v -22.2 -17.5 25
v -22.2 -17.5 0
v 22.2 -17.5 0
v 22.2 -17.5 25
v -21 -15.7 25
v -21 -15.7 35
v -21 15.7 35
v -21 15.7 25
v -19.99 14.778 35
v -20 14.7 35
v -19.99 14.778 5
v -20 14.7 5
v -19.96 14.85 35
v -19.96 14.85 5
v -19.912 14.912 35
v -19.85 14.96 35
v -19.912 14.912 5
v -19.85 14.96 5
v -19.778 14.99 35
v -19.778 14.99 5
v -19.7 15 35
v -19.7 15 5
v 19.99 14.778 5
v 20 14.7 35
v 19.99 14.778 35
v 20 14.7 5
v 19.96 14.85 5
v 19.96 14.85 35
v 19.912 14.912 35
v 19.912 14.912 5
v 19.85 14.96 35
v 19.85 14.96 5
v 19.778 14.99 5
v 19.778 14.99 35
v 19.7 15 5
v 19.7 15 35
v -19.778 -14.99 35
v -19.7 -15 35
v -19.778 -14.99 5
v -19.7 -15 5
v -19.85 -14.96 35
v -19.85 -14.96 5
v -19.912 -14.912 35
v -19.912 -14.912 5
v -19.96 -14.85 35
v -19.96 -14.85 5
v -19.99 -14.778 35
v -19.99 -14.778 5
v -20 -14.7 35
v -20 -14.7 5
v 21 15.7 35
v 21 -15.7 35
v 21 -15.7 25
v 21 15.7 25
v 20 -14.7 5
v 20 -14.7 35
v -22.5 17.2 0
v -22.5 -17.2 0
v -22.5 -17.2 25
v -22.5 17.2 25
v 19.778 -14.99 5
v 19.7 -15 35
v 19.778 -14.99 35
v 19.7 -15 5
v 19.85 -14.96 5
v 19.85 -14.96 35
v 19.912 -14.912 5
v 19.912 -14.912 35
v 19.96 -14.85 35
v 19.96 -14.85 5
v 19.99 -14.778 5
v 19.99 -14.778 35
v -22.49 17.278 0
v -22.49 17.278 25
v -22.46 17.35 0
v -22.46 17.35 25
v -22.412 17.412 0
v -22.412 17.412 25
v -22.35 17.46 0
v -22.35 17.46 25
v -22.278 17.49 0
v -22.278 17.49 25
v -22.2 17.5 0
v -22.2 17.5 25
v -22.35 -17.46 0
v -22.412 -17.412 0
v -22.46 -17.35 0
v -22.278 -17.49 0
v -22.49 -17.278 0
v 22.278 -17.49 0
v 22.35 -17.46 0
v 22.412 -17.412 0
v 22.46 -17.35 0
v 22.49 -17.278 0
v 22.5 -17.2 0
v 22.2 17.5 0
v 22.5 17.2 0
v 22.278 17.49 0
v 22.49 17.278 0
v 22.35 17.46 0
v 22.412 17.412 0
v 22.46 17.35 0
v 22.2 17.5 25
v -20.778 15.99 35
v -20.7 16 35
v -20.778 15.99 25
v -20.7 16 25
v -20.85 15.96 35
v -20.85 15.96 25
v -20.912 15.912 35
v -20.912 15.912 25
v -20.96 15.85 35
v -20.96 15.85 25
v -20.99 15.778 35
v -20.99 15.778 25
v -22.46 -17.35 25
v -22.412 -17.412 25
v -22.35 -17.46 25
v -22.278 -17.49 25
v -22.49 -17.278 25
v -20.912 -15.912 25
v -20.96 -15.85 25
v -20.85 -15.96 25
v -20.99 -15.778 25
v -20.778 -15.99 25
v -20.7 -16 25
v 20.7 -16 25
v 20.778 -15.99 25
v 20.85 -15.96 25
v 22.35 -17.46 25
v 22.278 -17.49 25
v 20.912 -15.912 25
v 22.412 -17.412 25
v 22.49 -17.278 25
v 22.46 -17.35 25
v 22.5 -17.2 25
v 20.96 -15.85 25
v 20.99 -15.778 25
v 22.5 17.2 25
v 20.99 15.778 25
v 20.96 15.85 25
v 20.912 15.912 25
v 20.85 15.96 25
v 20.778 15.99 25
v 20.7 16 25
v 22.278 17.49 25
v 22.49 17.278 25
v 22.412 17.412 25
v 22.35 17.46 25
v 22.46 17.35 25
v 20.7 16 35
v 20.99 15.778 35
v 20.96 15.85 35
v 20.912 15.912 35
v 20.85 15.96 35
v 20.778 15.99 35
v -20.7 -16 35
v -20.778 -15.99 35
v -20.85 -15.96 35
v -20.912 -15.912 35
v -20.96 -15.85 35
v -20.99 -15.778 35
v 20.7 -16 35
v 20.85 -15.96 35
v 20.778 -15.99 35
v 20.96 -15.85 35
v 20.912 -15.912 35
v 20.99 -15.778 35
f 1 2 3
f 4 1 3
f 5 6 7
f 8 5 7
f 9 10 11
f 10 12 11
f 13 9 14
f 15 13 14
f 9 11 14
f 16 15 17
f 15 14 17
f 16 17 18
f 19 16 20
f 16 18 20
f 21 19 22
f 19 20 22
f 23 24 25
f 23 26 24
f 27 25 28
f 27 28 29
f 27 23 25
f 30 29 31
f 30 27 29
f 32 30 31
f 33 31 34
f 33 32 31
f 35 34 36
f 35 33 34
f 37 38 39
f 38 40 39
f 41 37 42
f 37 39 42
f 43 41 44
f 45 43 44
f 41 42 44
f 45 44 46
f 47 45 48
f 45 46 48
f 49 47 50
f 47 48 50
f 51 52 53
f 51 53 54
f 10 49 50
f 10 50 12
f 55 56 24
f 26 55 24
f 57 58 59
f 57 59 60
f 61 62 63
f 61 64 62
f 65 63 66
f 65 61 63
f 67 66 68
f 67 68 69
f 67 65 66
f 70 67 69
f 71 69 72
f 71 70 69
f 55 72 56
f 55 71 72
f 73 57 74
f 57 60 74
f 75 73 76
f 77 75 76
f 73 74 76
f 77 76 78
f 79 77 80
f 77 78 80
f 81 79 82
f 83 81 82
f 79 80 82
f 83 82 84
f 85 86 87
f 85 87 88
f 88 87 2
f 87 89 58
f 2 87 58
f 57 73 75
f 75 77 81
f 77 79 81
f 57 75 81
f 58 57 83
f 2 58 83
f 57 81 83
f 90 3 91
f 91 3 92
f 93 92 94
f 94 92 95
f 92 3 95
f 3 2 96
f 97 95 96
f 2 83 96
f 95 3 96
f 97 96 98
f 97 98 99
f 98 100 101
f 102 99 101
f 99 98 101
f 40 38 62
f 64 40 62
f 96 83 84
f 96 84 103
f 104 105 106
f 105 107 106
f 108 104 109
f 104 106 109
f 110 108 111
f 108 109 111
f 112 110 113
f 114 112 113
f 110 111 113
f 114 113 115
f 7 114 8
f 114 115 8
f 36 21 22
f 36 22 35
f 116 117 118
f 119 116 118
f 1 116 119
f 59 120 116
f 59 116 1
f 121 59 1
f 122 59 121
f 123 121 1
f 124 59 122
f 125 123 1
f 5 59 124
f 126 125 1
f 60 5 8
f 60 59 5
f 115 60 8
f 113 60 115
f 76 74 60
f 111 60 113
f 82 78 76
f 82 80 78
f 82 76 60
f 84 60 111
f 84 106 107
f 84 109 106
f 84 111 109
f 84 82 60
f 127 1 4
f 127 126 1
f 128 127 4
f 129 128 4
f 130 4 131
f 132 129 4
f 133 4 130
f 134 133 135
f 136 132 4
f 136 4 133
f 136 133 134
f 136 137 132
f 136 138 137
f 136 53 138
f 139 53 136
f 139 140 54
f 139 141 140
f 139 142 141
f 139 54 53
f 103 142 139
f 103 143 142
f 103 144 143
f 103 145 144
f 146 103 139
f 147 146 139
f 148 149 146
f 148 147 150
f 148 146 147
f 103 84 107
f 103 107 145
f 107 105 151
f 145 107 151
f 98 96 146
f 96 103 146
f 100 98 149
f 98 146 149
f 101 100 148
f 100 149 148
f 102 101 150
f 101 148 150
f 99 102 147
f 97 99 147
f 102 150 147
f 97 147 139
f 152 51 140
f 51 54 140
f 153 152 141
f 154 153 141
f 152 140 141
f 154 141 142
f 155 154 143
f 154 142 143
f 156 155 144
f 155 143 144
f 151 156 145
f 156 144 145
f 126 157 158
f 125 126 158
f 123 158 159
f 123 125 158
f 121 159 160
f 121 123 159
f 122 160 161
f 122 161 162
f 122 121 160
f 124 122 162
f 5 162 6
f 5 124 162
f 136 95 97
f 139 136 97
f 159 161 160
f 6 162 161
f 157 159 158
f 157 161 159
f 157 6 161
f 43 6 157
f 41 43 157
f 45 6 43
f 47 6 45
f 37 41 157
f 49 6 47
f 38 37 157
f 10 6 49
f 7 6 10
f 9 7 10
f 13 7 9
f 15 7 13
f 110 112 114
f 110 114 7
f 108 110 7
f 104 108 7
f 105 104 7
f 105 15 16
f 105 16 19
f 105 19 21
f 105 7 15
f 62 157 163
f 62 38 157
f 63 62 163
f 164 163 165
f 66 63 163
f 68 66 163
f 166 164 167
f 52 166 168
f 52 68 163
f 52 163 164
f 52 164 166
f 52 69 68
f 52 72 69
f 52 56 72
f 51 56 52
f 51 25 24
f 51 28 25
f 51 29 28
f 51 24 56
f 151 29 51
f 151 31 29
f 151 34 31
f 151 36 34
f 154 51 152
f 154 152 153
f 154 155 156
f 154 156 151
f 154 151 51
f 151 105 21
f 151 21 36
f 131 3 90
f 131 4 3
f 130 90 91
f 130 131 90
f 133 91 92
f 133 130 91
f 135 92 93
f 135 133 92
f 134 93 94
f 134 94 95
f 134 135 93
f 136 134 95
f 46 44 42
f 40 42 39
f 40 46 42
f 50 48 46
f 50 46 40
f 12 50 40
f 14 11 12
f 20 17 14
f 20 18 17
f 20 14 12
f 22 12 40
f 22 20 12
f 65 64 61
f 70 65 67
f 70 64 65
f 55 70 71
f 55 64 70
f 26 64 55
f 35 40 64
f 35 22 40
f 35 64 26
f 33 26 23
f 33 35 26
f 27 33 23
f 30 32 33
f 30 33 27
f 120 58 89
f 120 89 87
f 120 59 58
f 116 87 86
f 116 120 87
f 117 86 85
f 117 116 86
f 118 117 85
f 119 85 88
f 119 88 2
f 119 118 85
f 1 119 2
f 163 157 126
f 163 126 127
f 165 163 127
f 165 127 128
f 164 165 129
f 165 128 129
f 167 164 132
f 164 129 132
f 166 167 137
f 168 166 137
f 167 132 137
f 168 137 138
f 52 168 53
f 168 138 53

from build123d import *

# Parameters (mm, degrees)
F0_W     = 45
F0_H     = 35
F1_DEPTH = 35
F2_W     = 40
F2_H     = 30
F3_DEPTH = 30
F4_W     = 45
F4_H     = 35
F4_W_2   = 42
F4_H_2   = 32
F5_DEPTH = 10
F6_R     = 0.3


with BuildPart() as f1:
    # F0 (on Top) → F1 (new body)
    with BuildSketch(Plane.XY):
        Rectangle(F0_W, F0_H)
    extrude(amount=F1_DEPTH)

    # F2 (on face) → F3 (cut)
    with BuildSketch(Plane.XY.offset(35)):
        Rectangle(F2_W, F2_H)
    extrude(amount=-F3_DEPTH, mode=Mode.SUBTRACT)

    # F4 (on face) → F5 (cut)
    with BuildSketch(Plane.XY.offset(35)):
        Rectangle(F4_W, F4_H)
        Rectangle(F4_W_2, F4_H_2, mode=Mode.SUBTRACT)
    extrude(amount=-F5_DEPTH, mode=Mode.SUBTRACT)

    # F6
    f6_edges = [f1.edges().sort_by_distance(p)[0] for p in [
        (-22.5, 17.5, 12.5),
        (22.5, 17.5, 12.5),
        (22.5, -17.5, 12.5),
        (-22.5, -17.5, 12.5),
        (-21, -16, 30),
        (21, -16, 30),
        (21, 16, 30),
        (-21, 16, 30),
        (-20, 15, 20),
        (20, 15, 20),
        (20, -15, 20),
        (-20, -15, 20),
    ]]
    fillet(f6_edges, radius=F6_R)


solid = f1.part
